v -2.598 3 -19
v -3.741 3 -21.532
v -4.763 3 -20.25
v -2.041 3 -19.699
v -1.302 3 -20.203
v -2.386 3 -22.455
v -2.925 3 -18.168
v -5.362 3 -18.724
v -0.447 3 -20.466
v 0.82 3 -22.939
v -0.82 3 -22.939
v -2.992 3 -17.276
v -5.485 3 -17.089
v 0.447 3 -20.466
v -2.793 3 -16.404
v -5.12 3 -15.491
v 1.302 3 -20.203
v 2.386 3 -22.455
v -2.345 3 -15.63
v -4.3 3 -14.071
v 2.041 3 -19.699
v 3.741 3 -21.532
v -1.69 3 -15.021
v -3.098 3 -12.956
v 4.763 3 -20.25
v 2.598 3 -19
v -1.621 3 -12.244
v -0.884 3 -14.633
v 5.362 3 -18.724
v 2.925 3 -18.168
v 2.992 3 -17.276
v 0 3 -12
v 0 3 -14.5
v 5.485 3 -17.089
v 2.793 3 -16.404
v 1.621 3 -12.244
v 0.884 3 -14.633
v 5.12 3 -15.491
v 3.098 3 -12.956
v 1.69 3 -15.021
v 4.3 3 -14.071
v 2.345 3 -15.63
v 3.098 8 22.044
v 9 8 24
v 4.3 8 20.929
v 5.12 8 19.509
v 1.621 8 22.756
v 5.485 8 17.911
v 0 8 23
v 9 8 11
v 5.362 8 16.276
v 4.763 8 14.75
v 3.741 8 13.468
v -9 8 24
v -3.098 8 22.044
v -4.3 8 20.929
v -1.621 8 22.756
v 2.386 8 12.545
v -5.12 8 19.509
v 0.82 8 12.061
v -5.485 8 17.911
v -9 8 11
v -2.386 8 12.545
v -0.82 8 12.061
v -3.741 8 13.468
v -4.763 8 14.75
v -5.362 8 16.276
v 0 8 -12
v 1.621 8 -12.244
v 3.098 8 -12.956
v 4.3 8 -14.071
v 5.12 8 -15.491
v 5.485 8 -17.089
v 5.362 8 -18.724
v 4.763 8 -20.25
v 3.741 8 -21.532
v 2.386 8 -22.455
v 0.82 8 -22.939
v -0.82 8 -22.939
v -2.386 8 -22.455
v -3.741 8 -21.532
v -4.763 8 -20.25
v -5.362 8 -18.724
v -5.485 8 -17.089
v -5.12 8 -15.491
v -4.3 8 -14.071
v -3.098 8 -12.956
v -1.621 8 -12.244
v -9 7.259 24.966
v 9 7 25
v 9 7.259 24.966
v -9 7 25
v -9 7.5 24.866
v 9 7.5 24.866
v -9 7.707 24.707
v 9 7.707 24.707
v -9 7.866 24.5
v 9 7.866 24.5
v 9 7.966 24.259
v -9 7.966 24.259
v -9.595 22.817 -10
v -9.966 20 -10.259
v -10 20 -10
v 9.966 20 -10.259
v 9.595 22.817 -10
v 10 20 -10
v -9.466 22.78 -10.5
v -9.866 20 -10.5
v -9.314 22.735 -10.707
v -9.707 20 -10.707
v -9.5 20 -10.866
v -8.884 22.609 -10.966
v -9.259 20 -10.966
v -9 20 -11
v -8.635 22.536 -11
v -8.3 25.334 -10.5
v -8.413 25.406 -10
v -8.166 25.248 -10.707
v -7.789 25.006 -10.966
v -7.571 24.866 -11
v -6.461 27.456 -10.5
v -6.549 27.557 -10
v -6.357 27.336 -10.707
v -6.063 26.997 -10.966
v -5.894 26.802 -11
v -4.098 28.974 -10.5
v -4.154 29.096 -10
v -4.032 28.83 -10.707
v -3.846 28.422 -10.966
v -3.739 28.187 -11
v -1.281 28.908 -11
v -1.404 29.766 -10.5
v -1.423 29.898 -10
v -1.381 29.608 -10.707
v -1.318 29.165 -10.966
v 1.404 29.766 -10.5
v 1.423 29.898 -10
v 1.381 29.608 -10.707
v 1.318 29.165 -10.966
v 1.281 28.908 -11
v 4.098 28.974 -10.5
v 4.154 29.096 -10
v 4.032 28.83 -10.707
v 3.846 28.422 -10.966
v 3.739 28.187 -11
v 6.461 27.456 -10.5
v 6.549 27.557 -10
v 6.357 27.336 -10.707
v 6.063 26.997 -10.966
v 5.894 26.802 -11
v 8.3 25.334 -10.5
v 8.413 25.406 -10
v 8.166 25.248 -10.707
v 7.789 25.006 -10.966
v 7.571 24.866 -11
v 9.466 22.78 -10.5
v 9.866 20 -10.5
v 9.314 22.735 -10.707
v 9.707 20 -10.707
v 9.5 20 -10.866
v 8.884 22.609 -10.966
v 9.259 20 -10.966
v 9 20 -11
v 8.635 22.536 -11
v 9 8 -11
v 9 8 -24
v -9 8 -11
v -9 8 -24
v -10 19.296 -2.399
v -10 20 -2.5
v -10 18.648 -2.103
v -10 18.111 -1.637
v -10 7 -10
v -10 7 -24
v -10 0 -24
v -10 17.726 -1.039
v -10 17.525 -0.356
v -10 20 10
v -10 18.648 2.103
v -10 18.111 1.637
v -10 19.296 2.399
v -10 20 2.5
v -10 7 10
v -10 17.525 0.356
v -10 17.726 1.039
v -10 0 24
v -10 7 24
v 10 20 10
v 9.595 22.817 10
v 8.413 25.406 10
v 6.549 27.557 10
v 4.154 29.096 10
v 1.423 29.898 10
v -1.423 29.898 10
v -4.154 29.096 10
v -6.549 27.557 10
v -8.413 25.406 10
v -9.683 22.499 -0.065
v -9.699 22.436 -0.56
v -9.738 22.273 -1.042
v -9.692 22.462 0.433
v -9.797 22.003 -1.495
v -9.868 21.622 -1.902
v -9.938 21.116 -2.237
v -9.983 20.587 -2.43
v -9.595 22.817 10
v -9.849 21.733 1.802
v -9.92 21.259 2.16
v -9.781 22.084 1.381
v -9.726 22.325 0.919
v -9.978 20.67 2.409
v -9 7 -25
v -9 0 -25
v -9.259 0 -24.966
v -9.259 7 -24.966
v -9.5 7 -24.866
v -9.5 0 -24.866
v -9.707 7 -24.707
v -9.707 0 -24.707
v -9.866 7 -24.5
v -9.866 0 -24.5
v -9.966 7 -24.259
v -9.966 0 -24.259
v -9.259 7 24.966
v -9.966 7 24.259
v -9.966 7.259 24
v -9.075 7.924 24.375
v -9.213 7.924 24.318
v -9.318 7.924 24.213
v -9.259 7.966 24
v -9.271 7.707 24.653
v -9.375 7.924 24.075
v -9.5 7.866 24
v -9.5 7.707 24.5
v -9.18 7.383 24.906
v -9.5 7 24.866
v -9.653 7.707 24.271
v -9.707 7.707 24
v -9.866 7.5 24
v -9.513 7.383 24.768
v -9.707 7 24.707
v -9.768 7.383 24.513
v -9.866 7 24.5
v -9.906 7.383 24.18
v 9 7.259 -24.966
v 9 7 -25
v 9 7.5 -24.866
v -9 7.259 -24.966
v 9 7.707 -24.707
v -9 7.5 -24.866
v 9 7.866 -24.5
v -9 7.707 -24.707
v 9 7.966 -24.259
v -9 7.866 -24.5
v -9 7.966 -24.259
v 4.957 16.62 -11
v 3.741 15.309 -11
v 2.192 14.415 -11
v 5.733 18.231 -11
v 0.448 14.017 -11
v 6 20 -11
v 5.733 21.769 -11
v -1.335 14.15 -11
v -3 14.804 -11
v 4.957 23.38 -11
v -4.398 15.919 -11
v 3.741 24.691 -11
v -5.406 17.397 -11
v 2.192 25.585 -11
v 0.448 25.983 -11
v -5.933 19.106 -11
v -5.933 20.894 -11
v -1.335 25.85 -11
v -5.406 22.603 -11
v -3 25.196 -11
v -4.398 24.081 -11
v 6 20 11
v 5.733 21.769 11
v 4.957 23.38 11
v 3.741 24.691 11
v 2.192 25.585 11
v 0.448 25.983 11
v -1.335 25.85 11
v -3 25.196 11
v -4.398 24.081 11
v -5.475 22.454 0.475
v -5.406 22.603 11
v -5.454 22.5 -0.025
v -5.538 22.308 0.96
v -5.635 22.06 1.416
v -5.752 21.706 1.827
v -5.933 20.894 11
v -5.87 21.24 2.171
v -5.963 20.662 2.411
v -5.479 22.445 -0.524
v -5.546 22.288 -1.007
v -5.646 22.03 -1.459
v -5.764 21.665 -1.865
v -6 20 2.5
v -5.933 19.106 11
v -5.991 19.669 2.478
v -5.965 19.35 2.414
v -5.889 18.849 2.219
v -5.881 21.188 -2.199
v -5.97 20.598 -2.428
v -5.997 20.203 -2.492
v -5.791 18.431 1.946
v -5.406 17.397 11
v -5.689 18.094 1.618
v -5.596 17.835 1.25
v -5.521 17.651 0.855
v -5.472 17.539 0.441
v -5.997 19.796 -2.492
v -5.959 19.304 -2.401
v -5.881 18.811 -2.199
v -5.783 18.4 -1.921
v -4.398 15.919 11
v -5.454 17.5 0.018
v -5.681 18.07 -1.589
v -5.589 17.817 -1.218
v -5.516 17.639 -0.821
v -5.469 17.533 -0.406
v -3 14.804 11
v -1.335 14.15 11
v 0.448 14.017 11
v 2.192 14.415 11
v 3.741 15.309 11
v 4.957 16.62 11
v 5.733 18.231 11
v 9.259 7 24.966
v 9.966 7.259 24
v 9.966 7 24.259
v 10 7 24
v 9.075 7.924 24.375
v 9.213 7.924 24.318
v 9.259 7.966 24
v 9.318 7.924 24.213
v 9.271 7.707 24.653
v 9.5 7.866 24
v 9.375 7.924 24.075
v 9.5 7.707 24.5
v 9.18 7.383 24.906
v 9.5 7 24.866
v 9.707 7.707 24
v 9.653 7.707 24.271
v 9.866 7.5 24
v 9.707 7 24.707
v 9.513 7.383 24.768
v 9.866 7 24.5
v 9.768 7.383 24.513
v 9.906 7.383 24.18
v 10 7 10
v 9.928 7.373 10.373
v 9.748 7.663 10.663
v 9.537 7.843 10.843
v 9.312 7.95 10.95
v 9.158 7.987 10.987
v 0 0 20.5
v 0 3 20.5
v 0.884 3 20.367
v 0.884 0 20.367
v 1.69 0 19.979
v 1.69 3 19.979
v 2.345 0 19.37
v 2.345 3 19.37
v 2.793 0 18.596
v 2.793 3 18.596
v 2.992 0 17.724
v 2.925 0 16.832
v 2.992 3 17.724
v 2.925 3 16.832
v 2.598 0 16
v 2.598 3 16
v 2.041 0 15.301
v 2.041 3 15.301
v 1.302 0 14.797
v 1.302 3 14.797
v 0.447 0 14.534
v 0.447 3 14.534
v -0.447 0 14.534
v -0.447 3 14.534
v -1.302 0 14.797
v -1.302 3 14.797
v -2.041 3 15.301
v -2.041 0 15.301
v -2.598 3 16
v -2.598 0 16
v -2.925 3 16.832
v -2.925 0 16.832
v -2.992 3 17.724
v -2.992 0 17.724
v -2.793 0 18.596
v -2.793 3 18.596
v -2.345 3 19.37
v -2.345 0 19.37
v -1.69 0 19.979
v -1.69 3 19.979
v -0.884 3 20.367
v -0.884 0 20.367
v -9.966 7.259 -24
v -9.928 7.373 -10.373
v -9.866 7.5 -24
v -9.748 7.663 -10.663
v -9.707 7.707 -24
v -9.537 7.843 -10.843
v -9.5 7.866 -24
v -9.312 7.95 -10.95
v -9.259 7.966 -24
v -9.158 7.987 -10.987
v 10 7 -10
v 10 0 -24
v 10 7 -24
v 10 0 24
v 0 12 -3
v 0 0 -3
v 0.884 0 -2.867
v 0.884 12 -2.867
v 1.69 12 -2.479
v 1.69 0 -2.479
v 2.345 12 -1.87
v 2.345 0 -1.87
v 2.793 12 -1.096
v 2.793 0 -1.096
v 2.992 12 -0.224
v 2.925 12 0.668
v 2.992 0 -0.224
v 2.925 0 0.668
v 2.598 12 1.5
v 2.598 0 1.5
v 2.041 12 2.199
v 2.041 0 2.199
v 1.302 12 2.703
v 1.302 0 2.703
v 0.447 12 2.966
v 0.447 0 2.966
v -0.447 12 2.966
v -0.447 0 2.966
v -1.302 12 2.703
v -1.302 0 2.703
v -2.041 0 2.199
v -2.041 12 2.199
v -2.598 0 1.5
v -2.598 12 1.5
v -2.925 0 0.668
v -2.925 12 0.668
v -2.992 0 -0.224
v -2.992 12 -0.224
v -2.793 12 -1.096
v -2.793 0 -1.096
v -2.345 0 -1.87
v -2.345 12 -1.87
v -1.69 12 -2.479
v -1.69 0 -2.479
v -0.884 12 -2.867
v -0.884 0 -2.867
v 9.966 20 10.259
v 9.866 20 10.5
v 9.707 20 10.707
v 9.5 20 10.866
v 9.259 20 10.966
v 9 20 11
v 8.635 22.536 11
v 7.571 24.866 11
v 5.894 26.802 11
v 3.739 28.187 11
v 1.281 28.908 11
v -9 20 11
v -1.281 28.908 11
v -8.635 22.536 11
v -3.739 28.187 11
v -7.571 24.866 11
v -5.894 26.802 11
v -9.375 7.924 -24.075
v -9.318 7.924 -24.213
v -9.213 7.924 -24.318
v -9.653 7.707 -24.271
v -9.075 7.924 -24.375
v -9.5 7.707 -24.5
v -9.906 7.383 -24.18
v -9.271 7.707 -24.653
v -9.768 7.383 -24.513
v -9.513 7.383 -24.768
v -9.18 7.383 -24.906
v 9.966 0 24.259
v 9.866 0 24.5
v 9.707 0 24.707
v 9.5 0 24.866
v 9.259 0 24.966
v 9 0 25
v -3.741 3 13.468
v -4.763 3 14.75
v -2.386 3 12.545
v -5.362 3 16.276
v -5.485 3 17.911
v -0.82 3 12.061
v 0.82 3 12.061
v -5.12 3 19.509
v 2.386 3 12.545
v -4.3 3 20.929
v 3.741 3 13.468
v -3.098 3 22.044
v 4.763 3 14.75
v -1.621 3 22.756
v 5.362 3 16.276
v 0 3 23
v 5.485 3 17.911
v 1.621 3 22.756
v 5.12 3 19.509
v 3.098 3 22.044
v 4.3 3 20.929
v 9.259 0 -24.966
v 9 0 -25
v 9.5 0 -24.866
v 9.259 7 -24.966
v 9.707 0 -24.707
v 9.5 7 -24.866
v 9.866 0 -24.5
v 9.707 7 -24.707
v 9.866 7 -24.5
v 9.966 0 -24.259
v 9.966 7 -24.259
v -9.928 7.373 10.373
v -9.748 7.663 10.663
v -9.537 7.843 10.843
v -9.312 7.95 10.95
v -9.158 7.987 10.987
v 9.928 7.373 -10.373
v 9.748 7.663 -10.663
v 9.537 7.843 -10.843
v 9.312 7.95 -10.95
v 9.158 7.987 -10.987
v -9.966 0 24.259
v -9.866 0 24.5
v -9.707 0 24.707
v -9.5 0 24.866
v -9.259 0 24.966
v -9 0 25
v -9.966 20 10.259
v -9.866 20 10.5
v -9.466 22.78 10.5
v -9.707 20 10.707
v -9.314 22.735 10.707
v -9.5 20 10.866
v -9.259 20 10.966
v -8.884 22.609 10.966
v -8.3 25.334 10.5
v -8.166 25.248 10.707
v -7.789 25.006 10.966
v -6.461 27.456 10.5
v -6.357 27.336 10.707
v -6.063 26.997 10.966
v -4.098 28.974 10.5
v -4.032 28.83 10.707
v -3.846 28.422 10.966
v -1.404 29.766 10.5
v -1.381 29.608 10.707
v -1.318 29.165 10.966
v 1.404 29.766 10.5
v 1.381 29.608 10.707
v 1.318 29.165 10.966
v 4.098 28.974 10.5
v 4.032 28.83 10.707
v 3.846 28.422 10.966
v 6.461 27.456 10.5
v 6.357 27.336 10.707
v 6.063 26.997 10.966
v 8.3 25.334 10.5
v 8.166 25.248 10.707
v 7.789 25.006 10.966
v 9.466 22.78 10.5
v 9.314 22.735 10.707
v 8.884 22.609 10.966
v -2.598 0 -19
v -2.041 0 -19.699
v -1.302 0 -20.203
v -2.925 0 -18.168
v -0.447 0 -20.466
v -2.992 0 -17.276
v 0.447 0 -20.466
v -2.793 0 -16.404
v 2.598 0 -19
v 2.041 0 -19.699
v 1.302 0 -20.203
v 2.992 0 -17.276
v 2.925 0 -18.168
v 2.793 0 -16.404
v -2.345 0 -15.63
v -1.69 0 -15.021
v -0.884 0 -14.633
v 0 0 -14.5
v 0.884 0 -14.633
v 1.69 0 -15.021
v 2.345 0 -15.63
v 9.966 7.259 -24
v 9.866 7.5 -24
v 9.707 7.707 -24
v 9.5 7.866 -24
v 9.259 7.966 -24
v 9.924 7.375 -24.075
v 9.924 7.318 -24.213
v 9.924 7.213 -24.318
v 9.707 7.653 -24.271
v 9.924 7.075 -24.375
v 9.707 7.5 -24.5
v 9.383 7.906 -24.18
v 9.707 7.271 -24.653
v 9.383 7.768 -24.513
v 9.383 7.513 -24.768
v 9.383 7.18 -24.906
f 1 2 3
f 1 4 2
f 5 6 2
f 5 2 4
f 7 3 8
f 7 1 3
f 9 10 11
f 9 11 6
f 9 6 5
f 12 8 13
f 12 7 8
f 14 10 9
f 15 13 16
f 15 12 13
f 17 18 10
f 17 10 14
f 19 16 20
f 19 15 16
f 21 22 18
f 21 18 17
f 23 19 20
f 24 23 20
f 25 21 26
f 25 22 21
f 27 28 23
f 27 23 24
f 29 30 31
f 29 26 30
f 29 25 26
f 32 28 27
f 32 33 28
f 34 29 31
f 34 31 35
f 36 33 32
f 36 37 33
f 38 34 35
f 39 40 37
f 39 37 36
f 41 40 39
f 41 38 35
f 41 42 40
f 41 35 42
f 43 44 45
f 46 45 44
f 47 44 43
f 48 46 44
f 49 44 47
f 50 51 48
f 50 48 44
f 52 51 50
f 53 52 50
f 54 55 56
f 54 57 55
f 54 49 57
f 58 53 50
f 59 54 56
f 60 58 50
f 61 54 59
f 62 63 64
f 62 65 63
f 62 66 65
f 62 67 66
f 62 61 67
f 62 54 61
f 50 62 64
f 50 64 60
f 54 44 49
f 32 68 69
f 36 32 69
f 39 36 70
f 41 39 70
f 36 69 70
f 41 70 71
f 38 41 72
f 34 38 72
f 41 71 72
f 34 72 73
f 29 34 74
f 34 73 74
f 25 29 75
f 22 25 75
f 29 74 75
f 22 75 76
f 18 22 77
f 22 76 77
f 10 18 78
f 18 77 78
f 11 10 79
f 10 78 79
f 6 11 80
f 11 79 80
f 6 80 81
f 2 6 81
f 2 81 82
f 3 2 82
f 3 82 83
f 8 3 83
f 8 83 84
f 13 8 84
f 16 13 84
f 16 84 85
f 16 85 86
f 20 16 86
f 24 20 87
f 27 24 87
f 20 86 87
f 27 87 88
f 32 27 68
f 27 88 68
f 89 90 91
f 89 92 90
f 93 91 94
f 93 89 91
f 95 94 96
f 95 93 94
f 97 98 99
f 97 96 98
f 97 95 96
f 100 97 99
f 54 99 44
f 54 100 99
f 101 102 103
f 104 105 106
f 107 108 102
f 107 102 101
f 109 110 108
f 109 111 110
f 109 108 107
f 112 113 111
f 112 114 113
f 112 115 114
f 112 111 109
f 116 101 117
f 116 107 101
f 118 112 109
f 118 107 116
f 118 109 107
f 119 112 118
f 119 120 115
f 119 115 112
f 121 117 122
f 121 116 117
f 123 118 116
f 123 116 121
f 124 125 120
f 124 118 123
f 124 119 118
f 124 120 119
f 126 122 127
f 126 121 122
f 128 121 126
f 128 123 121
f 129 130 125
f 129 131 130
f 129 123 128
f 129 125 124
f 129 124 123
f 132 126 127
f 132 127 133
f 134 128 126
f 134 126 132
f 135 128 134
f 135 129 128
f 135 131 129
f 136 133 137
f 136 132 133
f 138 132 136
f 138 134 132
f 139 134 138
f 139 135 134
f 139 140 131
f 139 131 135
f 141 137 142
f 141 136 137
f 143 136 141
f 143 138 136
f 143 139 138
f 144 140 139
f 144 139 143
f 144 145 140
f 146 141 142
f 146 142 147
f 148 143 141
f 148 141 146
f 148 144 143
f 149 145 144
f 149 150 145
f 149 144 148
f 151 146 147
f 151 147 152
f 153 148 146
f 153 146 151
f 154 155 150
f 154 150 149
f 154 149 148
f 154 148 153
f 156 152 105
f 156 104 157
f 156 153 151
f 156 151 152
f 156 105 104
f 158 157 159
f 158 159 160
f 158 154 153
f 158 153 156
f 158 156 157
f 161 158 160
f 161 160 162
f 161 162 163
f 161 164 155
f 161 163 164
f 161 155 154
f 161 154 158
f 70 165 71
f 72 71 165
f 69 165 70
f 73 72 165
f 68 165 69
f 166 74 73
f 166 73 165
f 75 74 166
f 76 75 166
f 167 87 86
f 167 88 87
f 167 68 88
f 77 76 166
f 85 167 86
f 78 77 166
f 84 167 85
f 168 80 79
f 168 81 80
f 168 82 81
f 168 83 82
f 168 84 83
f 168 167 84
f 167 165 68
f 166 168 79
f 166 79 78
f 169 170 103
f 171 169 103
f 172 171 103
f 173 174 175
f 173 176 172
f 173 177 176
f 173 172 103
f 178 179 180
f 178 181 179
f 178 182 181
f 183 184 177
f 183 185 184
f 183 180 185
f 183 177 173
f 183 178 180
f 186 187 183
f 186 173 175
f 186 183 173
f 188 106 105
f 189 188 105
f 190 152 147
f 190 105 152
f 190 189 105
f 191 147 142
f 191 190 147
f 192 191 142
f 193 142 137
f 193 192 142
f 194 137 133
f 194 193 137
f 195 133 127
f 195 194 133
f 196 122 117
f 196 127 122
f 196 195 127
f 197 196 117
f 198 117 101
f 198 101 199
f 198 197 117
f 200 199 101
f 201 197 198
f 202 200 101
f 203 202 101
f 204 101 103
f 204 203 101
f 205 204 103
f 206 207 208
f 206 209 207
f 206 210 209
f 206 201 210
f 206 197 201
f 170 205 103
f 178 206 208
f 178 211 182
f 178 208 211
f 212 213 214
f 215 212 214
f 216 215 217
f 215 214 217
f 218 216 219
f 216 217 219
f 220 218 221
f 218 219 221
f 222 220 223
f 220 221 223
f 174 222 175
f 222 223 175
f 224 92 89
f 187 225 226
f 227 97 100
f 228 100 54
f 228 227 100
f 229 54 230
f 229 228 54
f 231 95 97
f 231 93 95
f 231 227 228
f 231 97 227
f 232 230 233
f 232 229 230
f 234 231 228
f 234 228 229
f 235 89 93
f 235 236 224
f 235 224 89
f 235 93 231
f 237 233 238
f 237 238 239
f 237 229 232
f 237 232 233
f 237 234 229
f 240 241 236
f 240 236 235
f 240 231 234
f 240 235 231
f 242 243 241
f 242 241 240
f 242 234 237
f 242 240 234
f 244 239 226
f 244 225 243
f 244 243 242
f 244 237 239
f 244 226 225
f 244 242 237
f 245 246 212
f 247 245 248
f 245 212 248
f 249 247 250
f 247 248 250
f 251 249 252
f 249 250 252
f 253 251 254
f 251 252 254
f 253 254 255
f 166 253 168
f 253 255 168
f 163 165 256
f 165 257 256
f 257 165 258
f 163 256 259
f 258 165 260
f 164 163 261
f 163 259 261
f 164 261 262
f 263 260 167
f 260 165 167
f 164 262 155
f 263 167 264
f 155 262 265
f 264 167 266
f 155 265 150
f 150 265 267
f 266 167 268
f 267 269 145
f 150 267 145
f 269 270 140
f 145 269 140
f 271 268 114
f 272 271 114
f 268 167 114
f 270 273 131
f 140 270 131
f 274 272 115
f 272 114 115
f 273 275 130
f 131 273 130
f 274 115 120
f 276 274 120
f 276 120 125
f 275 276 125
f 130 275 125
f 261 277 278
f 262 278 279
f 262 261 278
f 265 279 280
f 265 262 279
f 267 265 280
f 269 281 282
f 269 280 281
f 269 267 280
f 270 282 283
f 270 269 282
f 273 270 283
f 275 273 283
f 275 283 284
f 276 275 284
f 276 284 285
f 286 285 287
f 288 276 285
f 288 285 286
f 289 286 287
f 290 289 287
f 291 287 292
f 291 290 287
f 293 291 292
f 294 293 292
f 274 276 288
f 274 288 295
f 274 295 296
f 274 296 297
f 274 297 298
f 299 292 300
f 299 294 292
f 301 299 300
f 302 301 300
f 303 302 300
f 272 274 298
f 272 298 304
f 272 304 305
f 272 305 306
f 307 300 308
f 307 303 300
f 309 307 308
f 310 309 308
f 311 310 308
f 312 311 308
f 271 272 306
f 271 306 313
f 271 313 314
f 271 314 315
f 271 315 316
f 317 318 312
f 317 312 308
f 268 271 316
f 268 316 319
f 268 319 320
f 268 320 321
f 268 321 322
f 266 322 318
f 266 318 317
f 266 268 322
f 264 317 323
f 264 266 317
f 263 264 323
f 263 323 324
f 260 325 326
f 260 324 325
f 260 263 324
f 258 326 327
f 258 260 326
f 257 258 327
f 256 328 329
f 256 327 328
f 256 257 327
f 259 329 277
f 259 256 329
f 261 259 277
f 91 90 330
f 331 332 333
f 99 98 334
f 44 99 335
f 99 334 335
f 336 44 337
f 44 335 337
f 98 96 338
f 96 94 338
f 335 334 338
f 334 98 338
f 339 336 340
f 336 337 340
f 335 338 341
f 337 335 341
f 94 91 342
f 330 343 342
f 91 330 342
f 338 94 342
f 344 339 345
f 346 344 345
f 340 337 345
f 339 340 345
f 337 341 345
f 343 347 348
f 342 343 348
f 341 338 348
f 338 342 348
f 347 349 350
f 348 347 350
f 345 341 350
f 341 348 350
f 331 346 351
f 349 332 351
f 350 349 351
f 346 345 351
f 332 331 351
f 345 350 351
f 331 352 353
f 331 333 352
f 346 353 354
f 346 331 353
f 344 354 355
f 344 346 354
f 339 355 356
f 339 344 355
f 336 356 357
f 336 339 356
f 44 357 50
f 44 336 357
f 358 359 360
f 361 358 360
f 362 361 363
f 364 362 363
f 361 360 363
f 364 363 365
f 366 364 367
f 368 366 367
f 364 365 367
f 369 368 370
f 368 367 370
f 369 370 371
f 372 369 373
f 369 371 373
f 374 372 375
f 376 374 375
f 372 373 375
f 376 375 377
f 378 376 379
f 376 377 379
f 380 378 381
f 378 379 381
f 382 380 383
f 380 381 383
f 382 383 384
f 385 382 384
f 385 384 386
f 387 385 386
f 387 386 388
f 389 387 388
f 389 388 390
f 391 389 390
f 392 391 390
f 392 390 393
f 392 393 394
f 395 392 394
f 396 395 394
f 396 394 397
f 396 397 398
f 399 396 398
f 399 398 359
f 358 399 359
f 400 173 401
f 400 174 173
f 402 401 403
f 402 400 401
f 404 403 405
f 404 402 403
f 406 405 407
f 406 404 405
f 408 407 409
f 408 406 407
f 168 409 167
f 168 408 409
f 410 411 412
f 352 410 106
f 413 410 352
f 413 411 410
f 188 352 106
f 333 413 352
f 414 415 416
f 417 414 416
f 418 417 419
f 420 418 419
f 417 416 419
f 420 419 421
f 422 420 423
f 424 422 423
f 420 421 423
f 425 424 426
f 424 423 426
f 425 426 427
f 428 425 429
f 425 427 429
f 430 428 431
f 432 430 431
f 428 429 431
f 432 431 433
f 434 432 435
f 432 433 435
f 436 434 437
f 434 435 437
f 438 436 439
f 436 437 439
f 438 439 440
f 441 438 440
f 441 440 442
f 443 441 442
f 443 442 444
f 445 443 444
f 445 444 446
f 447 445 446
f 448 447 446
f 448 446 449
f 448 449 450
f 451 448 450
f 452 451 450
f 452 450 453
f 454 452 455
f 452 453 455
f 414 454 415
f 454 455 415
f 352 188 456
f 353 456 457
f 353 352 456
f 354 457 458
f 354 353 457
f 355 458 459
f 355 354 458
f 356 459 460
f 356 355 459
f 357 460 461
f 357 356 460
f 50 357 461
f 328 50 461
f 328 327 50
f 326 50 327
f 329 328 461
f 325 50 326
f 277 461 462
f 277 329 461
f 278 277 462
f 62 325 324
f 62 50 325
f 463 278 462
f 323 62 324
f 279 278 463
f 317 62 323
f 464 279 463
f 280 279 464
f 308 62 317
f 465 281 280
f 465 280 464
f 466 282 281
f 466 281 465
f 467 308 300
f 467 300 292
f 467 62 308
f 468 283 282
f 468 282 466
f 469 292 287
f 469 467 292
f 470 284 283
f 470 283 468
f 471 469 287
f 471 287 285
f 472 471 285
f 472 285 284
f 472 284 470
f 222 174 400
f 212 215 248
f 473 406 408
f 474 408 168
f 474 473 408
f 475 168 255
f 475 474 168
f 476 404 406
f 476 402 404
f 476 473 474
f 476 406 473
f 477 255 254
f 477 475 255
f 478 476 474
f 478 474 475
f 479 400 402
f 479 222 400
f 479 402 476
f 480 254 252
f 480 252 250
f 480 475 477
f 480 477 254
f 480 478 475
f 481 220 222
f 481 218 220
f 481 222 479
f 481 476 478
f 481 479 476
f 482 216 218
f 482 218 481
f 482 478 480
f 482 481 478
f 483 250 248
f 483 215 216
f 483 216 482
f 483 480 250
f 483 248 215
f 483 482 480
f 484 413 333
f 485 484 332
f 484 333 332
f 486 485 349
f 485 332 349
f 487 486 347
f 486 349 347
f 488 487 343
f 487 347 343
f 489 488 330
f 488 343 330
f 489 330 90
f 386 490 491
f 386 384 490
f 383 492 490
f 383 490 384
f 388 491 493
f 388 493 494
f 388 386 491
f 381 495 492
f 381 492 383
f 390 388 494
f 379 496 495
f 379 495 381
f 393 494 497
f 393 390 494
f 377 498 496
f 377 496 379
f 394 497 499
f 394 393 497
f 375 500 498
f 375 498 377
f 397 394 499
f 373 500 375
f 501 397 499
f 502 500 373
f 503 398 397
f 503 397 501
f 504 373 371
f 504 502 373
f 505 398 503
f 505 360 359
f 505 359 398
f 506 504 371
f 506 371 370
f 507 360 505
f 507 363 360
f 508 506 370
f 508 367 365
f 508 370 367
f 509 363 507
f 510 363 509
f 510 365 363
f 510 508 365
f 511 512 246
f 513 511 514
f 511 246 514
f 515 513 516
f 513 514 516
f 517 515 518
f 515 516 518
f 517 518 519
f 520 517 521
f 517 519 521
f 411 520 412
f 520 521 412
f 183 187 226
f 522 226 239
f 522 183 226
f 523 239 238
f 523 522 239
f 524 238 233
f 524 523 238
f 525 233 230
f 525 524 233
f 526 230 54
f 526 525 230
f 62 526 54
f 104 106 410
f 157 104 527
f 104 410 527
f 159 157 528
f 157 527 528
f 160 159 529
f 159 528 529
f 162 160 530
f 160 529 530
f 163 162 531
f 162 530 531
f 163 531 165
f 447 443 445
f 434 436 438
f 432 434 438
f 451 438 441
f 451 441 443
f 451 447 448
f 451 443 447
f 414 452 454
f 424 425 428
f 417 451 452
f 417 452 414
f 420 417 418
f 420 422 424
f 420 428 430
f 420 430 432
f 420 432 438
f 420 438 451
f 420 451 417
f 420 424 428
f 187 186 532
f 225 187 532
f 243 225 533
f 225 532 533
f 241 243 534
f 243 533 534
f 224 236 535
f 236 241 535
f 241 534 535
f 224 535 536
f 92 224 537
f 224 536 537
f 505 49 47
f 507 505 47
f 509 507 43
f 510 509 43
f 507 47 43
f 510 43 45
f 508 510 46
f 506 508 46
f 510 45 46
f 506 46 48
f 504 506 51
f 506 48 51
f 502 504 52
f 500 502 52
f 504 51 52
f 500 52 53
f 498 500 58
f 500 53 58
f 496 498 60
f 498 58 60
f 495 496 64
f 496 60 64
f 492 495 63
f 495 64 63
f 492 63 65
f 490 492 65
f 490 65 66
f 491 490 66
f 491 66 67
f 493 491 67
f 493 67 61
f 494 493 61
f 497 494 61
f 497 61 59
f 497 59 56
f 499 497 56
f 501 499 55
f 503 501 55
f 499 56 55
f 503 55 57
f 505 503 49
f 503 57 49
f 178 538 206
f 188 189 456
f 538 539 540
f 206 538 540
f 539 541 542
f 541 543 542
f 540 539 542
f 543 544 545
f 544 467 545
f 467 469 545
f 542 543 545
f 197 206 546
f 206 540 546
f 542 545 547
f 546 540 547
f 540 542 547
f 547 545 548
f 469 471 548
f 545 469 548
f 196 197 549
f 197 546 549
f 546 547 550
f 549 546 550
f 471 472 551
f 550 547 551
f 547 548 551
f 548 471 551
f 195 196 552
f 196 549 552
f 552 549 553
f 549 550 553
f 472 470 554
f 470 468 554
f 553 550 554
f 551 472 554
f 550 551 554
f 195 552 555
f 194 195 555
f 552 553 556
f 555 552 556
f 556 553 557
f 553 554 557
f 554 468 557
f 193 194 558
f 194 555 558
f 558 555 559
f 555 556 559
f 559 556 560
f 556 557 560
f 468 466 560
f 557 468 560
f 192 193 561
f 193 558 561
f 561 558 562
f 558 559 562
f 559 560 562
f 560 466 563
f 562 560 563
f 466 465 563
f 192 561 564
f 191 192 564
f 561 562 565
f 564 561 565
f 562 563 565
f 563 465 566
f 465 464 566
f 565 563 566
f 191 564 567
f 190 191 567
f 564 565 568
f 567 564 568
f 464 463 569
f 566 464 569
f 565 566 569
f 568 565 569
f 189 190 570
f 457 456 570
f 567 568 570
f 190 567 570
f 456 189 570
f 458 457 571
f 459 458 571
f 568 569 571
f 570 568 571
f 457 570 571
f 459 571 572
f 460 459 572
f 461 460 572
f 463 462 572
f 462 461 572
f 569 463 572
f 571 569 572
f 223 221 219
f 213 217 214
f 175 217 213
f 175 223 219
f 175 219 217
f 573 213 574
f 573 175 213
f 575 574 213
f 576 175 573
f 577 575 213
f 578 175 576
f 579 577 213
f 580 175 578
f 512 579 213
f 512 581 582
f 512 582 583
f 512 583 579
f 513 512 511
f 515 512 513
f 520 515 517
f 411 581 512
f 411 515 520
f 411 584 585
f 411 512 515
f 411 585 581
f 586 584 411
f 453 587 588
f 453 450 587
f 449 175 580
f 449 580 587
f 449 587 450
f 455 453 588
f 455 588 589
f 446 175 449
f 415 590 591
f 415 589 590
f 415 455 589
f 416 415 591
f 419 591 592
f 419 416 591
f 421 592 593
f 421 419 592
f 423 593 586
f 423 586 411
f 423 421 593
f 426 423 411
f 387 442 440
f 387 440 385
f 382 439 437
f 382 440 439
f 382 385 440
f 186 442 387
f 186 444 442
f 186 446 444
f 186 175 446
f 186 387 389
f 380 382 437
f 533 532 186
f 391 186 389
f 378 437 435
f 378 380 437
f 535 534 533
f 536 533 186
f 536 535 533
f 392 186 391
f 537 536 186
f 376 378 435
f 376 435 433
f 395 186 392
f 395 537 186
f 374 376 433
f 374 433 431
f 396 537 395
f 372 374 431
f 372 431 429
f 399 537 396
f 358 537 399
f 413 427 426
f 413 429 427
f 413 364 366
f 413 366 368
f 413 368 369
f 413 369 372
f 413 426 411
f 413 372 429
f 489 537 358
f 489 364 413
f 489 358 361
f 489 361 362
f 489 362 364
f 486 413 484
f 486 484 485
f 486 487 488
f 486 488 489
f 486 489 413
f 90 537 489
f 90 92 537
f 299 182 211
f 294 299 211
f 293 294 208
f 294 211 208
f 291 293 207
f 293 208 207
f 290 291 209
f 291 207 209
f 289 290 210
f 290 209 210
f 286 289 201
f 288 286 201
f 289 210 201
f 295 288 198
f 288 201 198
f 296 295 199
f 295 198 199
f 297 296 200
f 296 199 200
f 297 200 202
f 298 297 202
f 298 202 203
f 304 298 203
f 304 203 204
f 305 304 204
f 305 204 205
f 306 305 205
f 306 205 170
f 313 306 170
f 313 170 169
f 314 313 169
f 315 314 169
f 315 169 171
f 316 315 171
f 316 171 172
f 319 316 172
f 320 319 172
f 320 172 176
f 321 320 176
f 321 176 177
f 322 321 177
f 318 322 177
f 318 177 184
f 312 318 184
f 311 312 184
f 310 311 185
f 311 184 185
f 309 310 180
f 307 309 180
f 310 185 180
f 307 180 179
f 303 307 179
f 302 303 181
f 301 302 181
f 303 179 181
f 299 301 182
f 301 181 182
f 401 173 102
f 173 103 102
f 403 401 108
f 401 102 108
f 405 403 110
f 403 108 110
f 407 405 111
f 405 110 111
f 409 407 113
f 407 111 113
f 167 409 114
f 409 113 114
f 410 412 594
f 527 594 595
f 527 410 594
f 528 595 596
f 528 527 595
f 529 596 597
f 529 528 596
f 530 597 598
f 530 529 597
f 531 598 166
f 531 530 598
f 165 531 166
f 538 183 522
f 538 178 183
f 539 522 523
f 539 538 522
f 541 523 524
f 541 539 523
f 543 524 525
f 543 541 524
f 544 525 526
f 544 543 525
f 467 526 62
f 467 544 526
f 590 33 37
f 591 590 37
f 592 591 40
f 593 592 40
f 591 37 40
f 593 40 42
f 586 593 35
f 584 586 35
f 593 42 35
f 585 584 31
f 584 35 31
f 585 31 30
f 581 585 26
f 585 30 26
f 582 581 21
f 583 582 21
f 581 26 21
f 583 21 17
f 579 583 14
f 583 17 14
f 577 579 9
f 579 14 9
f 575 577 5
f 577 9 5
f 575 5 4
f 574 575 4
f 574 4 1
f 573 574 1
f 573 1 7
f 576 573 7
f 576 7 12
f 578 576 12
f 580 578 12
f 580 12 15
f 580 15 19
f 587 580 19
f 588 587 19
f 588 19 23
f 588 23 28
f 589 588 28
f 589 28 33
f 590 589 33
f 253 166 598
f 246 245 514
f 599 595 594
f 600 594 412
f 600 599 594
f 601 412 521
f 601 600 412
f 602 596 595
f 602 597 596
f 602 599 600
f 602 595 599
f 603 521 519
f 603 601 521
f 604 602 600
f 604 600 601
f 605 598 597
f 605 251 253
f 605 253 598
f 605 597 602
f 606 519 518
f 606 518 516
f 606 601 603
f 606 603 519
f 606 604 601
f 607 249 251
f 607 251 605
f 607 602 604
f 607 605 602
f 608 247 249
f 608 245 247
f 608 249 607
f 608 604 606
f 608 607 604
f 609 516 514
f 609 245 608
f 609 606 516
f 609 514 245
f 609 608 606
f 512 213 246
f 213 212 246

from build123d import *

# Parameters (mm, degrees)
SKETCH_1_R               = 6
EXTRUDE_1_DEPTH          = 25
CUT_EXTRUDE_1_DEPTH      = 41.311288741
CUT_EXTRUDE_1_DEPTH_BACK = 41.311288741
SKETCH_2_W               = 21.902921801
SKETCH_2_H               = 31.191688498
SKETCH_2_W_2             = 23.513880173
SKETCH_2_H_2             = 33.775615356
CUT_EXTRUDE_2_REACH      = 45.875
CUT_EXTRUDE_2_END_RADIUS = 6
SKETCH_3_R               = 2.5
SKETCH_4_R               = 3
CUT_EXTRUDE_3_DEPTH      = 12
SKETCH_5_R               = 5.5
CUT_EXTRUDE_4_DEPTH      = 5
SKETCH_6_R               = 3
CUT_EXTRUDE_5_DEPTH      = 39.131352027
FILLET_1_R               = 1


with BuildPart() as part:
    # Эскиз1 → Бобышка-Вытянуть1 (new, symmetric)
    with BuildSketch(Plane.XY):
        with BuildLine():
            Line((-10, 0), (10, 0))
            Line((10, 0), (10, 20))
            ThreePointArc((10, 20), (0, 30), (-10, 20))
            Line((-10, 20), (-10, 0))
        make_face()
        with Locations((0, 20)):
            Circle(SKETCH_1_R, mode=Mode.SUBTRACT)
    extrude(amount=EXTRUDE_1_DEPTH, both=True)

    # Эскиз2 → Вырез-Вытянуть1 (cut, two sides: drawn at the far end of the back side and taken through both)
    with BuildSketch(Plane(origin=(0, 0, 0), x_dir=(0, 0, -1), z_dir=(1, 0, 0)).offset(-CUT_EXTRUDE_1_DEPTH_BACK)):
        with Locations((21.951460901, 23.595844249)):
            Rectangle(SKETCH_2_W, SKETCH_2_H)
        with Locations((-22.756940087, 24.887807678)):
            Rectangle(SKETCH_2_W_2, SKETCH_2_H_2)
    extrude(amount=CUT_EXTRUDE_1_DEPTH + CUT_EXTRUDE_1_DEPTH_BACK, mode=Mode.SUBTRACT)

    # Вырез-Вытянуть2: up to this cylinder (the profile starts outside it)
    cut_extrude_2_end = Plane(origin=(0, 20, 0), z_dir=(0, 0, -1)) * Cylinder(CUT_EXTRUDE_2_END_RADIUS, 104.75, mode=Mode.PRIVATE)
    # Эскиз3 → Вырез-Вытянуть2 (cut, up to the surface)
    with BuildSketch(Plane.ZY.offset(10), mode=Mode.PRIVATE) as cut_extrude_2_sk1:
        with Locations((0, 20)):
            Circle(SKETCH_3_R)
    cut_extrude_2_tool1 = extrude(cut_extrude_2_sk1.sketch, amount=-CUT_EXTRUDE_2_REACH, mode=Mode.PRIVATE) - cut_extrude_2_end
    add(cut_extrude_2_tool1.solids().sort_by_distance((-10, 20, 0))[0], mode=Mode.SUBTRACT)

    # Эскиз4 → Вырез-Вытянуть3 (cut)
    with BuildSketch(Plane(origin=(0, 0, 0), x_dir=(-1, 0, 0), z_dir=(0, -1, 0))):
        with Locations(Location((0, 0, 0), (0, 0, 90))):
            Circle(SKETCH_4_R)
    extrude(amount=-CUT_EXTRUDE_3_DEPTH, mode=Mode.SUBTRACT)

    # Эскиз5 → Вырез-Вытянуть4 (cut)
    with BuildSketch(Plane(origin=(0, 8, 0), x_dir=(1, 0, 0), z_dir=(0, 1, 0))):
        with Locations(Location((0, 17.5, 0), (0, 0, 270))):
            Circle(SKETCH_5_R)
        with Locations(Location((0, -17.5, 0), (0, 0, 270))):
            Circle(SKETCH_5_R)
    extrude(amount=-CUT_EXTRUDE_4_DEPTH, mode=Mode.SUBTRACT)

    # Эскиз6 → Вырез-Вытянуть5 (cut, through all)
    with BuildSketch(Plane(origin=(0, 3, 0), x_dir=(1, 0, 0), z_dir=(0, 1, 0))):
        with Locations(Location((0, 17.5, 0), (0, 0, 270))):
            Circle(SKETCH_6_R)
        with Locations(Location((0, -17.5, 0), (0, 0, 270))):
            Circle(SKETCH_6_R)
    extrude(amount=-CUT_EXTRUDE_5_DEPTH, mode=Mode.SUBTRACT)

    # Скругление1
    fillet_1_edges = [part.edges().sort_by_distance(p)[0] for p in [
        (10, 4, 25),
        (-10, 4, -25),
        (-10, 4, 25),
        (-10, 8, -18),
        (0, 8, -25),
        (10, 8, -18),
        (10, 14, -11),
        (0, 30, -11),
        (-10, 14, -11),
        (0, 8, 25),
        (-10, 14, 11),
        (0, 30, 11),
        (-10, 8, 18),
        (10, 8, 18),
        (10, 14, 11),
        (10, 4, -25),
    ]]
    fillet(fillet_1_edges, radius=FILLET_1_R)


solid = part.part
